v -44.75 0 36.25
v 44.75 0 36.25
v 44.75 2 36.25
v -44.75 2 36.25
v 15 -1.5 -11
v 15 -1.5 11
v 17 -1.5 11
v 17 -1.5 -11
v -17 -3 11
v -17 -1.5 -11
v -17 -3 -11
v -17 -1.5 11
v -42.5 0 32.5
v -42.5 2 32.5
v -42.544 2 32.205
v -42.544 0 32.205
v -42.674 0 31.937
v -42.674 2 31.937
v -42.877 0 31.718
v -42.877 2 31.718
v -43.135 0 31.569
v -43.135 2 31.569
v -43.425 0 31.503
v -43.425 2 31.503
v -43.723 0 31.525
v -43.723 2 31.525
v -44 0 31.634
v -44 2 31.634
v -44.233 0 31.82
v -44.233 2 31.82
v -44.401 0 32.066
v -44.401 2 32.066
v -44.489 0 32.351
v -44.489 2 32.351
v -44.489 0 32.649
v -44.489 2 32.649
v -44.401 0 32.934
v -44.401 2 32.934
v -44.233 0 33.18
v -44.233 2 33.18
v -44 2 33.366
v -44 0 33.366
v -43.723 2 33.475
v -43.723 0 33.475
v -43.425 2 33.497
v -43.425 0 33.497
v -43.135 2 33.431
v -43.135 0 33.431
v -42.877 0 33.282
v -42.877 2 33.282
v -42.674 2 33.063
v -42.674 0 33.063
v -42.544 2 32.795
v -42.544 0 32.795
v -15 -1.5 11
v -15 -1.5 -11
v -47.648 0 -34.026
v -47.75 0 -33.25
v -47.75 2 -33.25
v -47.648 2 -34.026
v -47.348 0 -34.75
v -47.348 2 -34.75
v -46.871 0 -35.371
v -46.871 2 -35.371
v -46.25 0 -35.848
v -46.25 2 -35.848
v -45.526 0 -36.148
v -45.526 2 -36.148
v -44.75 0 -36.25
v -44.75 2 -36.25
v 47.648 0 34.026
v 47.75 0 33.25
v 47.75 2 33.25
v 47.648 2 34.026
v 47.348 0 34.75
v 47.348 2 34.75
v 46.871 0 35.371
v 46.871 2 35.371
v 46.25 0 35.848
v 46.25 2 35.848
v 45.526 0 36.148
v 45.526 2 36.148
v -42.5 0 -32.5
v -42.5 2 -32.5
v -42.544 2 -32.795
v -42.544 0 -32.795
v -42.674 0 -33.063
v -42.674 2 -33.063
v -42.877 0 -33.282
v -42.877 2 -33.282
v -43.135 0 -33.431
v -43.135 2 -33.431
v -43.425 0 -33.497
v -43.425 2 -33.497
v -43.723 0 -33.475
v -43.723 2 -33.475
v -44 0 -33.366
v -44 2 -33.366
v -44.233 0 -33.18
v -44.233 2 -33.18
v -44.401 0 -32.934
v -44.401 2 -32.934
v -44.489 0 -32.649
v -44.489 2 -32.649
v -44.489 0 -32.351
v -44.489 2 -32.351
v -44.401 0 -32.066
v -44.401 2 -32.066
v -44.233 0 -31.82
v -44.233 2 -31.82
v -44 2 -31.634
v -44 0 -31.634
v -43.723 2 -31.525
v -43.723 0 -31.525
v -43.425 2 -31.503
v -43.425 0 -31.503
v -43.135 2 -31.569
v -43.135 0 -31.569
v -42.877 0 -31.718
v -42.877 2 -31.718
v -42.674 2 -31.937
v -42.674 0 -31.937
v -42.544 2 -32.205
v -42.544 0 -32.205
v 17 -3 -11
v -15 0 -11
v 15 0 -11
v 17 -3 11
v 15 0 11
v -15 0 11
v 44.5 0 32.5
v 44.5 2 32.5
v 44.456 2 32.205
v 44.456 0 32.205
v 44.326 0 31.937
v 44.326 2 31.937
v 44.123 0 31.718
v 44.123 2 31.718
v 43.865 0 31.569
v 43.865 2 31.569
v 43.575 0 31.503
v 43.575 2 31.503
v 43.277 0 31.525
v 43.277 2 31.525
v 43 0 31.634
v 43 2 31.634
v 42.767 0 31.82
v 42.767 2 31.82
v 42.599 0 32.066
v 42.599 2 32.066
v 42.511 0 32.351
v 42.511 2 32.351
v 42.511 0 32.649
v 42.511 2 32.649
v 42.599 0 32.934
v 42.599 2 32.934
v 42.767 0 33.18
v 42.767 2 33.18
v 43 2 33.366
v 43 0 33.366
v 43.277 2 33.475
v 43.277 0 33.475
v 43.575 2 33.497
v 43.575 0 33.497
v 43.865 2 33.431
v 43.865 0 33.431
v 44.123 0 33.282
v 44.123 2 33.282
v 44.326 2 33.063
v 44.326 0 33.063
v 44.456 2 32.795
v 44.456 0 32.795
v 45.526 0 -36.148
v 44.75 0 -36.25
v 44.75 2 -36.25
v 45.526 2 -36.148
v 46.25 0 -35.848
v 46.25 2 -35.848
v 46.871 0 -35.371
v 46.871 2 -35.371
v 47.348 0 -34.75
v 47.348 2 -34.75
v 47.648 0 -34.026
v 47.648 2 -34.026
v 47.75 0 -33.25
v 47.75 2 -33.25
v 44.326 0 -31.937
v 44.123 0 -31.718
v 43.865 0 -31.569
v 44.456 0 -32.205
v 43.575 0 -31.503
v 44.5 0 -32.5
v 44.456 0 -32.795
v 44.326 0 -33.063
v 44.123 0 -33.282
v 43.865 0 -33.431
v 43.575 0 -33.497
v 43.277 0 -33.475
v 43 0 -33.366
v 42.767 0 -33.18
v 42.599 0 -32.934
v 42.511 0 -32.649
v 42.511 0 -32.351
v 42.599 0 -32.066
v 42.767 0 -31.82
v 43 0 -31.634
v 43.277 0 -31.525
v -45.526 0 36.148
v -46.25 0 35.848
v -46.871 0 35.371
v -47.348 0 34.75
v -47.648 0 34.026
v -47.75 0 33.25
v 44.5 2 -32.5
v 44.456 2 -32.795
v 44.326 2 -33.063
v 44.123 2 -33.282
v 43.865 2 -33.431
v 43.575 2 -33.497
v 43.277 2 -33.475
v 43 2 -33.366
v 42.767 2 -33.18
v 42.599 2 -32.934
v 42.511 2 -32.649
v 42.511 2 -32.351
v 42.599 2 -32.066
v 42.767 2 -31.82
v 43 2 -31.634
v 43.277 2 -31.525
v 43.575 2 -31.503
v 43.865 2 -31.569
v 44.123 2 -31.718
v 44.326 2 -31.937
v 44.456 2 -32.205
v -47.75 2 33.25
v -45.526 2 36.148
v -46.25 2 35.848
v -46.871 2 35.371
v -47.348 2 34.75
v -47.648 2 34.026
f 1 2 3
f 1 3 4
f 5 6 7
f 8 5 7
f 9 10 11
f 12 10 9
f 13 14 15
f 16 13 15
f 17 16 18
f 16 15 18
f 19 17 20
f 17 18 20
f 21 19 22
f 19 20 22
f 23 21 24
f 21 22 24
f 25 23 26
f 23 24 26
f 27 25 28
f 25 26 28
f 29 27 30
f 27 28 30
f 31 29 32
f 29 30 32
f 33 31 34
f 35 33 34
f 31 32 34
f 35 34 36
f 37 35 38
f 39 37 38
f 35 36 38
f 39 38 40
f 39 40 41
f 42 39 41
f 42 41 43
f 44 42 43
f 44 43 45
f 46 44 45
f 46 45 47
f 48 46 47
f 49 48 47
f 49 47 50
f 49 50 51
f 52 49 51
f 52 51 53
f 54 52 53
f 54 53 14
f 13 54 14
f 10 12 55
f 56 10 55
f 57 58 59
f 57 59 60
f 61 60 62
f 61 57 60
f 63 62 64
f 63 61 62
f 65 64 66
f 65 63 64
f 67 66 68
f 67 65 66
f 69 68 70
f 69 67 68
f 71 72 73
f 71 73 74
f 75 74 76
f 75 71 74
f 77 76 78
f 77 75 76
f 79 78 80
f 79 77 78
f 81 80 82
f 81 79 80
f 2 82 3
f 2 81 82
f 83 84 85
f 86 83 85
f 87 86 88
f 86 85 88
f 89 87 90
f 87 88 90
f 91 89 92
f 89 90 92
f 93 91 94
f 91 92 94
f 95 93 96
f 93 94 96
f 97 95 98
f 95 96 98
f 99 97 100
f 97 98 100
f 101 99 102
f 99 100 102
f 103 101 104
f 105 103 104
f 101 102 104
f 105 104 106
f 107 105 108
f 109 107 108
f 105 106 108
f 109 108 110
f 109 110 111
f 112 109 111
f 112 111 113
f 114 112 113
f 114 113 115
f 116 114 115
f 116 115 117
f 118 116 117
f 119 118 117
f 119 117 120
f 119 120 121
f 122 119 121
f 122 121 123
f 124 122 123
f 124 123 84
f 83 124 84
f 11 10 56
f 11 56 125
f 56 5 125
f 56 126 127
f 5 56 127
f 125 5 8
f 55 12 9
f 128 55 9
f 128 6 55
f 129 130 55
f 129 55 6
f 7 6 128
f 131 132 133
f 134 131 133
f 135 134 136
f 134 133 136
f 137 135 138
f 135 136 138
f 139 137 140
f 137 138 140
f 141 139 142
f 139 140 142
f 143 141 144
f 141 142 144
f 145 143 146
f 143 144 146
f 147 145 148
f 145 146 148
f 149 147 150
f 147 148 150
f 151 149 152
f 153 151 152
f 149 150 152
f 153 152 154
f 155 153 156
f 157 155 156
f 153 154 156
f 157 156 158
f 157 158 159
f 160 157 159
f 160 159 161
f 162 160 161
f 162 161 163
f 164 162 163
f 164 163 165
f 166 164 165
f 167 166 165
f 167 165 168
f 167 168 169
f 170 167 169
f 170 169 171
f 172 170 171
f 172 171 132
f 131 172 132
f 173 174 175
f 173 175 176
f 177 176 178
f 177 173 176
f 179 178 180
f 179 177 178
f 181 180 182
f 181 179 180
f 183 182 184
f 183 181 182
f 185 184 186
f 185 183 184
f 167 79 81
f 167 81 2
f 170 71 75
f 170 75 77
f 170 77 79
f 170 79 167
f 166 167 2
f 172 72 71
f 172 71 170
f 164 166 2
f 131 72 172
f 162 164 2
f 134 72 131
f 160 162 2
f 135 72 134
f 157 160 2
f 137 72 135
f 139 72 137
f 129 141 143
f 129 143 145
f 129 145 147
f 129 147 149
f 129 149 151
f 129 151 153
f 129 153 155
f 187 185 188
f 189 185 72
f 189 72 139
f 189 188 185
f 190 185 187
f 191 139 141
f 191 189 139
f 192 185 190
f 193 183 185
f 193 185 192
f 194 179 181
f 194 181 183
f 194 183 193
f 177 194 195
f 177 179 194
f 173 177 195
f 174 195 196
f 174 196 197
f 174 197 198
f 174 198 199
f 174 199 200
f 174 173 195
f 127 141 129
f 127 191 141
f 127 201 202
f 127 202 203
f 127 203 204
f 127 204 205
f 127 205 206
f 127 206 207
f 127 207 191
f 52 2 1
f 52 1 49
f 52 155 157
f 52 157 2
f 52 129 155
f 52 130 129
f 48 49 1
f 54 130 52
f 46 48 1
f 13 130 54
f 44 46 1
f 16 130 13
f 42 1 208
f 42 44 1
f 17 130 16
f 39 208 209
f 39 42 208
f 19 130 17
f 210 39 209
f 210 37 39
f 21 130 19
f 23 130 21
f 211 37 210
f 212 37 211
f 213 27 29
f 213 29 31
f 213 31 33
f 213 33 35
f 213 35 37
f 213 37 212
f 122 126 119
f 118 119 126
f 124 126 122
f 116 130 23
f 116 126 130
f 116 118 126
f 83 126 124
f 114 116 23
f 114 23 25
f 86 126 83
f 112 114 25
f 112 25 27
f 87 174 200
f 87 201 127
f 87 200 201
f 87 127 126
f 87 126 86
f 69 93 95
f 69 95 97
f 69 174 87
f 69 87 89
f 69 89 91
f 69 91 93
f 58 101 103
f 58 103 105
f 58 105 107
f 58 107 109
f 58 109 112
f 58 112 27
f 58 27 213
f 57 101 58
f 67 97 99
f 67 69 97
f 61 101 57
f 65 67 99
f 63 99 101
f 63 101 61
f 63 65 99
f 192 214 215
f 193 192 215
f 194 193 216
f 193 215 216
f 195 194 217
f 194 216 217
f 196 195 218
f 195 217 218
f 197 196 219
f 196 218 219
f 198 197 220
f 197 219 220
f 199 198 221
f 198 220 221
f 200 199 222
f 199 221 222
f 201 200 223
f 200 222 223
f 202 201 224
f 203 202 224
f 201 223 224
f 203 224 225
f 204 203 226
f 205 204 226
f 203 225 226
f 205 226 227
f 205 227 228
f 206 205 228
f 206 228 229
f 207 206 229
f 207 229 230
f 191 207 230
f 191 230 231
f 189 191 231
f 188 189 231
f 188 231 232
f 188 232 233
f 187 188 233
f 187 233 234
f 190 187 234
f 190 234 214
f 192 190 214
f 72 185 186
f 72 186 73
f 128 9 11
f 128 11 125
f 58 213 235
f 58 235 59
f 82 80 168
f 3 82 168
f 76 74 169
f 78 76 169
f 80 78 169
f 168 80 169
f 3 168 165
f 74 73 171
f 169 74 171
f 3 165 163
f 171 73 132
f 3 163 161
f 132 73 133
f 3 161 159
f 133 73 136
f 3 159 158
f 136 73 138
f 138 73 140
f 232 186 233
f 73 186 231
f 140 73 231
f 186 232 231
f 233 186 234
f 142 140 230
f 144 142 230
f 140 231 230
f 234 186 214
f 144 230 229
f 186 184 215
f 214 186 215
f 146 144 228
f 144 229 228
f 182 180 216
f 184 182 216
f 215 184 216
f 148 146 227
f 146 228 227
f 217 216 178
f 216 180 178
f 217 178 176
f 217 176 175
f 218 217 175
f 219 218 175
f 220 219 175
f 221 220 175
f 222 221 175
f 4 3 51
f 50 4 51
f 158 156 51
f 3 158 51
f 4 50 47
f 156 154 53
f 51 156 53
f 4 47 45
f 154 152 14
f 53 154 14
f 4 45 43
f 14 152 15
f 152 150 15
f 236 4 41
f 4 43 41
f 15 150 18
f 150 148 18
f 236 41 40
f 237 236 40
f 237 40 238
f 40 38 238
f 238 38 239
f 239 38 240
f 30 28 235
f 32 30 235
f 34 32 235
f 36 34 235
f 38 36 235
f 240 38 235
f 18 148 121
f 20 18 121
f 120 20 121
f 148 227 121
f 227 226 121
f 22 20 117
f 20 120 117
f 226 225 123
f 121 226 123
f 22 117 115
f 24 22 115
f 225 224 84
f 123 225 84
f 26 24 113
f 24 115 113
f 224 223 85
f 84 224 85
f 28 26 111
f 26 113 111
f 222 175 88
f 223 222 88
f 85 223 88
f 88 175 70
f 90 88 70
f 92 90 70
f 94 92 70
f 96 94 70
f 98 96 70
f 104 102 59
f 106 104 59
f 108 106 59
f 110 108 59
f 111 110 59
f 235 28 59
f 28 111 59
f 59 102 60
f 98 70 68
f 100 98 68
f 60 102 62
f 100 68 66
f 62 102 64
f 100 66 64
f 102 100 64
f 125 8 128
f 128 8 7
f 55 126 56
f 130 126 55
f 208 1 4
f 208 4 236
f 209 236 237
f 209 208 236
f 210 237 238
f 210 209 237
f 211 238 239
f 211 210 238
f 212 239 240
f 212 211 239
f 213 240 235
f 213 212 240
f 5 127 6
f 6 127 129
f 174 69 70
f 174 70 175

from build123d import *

# Parameters (mm, degrees)
EXTRUDE_1_DEPTH          = 2
SKETCH_3_R               = 1
CUT_EXTRUDE_1_DEPTH      = 3
CUT_EXTRUDE_1_DEPTH_BACK = 13
SKETCH_4_W               = 34
SKETCH_4_H               = 22
EXTRUDE_3_DEPTH          = 3
SKETCH_5_W               = 2
SKETCH_5_H               = 22
CUT_EXTRUDE_3_DEPTH      = 1.5


with BuildPart() as part:
    # Эскиз1 → Бобышка-Вытянуть1 (new body)
    with BuildSketch(Plane(origin=(0, 0, 0), x_dir=(1, 0, 0), z_dir=(0, 1, 0))):
        with BuildLine():
            Line((-47.75, -33.25), (-47.75, 33.25))
            ThreePointArc((-47.75, 33.25), (-46.871320344, 35.371320344), (-44.75, 36.25))
            Line((-44.75, 36.25), (44.75, 36.25))
            ThreePointArc((44.75, 36.25), (46.871320344, 35.371320344), (47.75, 33.25))
            Line((47.75, 33.25), (47.75, -33.25))
            ThreePointArc((47.75, -33.25), (46.871320344, -35.371320344), (44.75, -36.25))
            Line((44.75, -36.25), (-44.75, -36.25))
            ThreePointArc((-44.75, -36.25), (-46.871320344, -35.371320344), (-47.75, -33.25))
        make_face()
    extrude(amount=EXTRUDE_1_DEPTH)

    # Эскиз3 → Вырез-Вытянуть1 (cut, two sides)
    with BuildSketch(Plane(origin=(0, 5, 0), x_dir=(1, 0, 0), z_dir=(0, 1, 0))) as cut_extrude_1_sk:
        with Locations((-43.5, 32.5)):
            Circle(SKETCH_3_R)
        with Locations((-43.5, -32.5)):
            Circle(SKETCH_3_R)
        with Locations((43.5, -32.5)):
            Circle(SKETCH_3_R)
        with Locations((43.5, 32.5)):
            Circle(SKETCH_3_R)
    extrude(amount=CUT_EXTRUDE_1_DEPTH, mode=Mode.SUBTRACT)
    extrude(cut_extrude_1_sk.sketch, amount=-CUT_EXTRUDE_1_DEPTH_BACK, mode=Mode.SUBTRACT)

    # Эскиз4 → Бобышка-Вытянуть3 (add)
    with BuildSketch(Plane.XZ):
        Rectangle(SKETCH_4_W, SKETCH_4_H)
    extrude(amount=EXTRUDE_3_DEPTH)

    # Эскиз5 → Вырез-Вытянуть3 (cut)
    with BuildSketch(Plane.XZ):
        with Locations((-16, 0)):
            Rectangle(SKETCH_5_W, SKETCH_5_H)
        with Locations((16, 0)):
            Rectangle(SKETCH_5_W, SKETCH_5_H)
    extrude(amount=CUT_EXTRUDE_3_DEPTH, mode=Mode.SUBTRACT)


solid = part.part
